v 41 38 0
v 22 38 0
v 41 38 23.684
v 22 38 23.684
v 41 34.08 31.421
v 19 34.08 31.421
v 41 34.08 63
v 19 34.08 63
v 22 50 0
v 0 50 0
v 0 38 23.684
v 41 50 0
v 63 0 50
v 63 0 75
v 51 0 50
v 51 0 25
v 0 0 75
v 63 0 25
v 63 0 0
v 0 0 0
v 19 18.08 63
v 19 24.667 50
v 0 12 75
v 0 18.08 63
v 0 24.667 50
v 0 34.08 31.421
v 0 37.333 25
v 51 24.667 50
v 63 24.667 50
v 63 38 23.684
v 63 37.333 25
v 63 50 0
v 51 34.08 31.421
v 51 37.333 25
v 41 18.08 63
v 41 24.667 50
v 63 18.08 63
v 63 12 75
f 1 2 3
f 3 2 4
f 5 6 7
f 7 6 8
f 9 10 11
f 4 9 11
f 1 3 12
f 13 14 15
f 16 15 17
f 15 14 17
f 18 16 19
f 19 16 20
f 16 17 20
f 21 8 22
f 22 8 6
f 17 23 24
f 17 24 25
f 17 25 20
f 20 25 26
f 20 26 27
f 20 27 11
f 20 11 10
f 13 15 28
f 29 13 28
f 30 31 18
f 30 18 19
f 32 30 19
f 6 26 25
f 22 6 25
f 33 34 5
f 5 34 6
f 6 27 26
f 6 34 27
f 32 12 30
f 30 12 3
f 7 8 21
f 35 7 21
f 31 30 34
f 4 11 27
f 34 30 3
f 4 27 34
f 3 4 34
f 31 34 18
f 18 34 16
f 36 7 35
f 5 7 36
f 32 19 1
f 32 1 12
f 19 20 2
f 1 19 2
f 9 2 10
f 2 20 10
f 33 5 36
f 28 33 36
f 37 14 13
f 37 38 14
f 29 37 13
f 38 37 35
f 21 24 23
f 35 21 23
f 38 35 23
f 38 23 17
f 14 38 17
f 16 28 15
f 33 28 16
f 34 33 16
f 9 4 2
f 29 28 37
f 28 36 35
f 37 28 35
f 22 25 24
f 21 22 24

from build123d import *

# Parameters (mm, degrees)
BOSS_EXTRUDE1_DEPTH   = 63
BOSS_EXTRUDE1_2_DEPTH = 63
BOSS_EXTRUDE2_DEPTH   = 51
BOSS_EXTRUDE3_DEPTH   = 22
BOSS_EXTRUDE4_START   = 41
BOSS_EXTRUDE4_DEPTH   = 22
BOSS_EXTRUDE5_START   = 19
BOSS_EXTRUDE5_DEPTH   = 22


with BuildPart() as part:
    # Sketch1 → Boss-Extrude1 (new body)
    with BuildSketch(Plane(origin=(0, 0, 0), x_dir=(0, 0, -1), z_dir=(1, 0, 0))):
        Polygon((-25, 0), (0, 0), (0, 38), (-23.684210526, 38), (-25, 37.333333333), align=None)
    extrude(amount=BOSS_EXTRUDE1_DEPTH)



with BuildPart() as body_2:
    # Sketch1 → Boss-Extrude1 2 (new body)
    with BuildSketch(Plane(origin=(0, 0, 0), x_dir=(0, 0, -1), z_dir=(1, 0, 0))):
        Polygon((-75, 0), (-50, 0), (-50, 24.666666667), (-75, 12), align=None)
    extrude(amount=BOSS_EXTRUDE1_2_DEPTH)


with BuildPart() as part_1:
    add(part.part)

    add(body_2.part)  # Boss-Extrude2 merges body 2
    # Sketch1<3> → Boss-Extrude2 (add)
    with BuildSketch(Plane(origin=(0, 0, 0), x_dir=(0, 0, -1), z_dir=(1, 0, 0))):
        Polygon((-50, 0), (-25, 0), (-25, 37.333333333), (-31.421052632, 34.08), (-50, 24.666666667), align=None)
    extrude(amount=BOSS_EXTRUDE2_DEPTH)

    # Sketch1<4> → Boss-Extrude3 (add)
    with BuildSketch(Plane(origin=(0, 0, 0), x_dir=(0, 0, -1), z_dir=(1, 0, 0))):
        Polygon((-23.684210526, 38), (0, 38), (0, 50), align=None)
    extrude(amount=BOSS_EXTRUDE3_DEPTH)

    # Sketch1<5> → Boss-Extrude4 (add)
    with BuildSketch(Plane(origin=(0, 0, 0), x_dir=(0, 0, -1), z_dir=(1, 0, 0)).offset(BOSS_EXTRUDE4_START)):
        Polygon((-23.684210526, 38), (0, 38), (0, 50), align=None)
    extrude(amount=BOSS_EXTRUDE4_DEPTH)

    # Sketch1<6> → Boss-Extrude5 (add)
    with BuildSketch(Plane(origin=(0, 0, 0), x_dir=(0, 0, -1), z_dir=(1, 0, 0)).offset(BOSS_EXTRUDE5_START)):
        Polygon((-63, 18.08), (-50, 24.666666667), (-31.421052632, 34.08), (-63, 34.08), align=None)
    extrude(amount=BOSS_EXTRUDE5_DEPTH)


solid = part_1.part
